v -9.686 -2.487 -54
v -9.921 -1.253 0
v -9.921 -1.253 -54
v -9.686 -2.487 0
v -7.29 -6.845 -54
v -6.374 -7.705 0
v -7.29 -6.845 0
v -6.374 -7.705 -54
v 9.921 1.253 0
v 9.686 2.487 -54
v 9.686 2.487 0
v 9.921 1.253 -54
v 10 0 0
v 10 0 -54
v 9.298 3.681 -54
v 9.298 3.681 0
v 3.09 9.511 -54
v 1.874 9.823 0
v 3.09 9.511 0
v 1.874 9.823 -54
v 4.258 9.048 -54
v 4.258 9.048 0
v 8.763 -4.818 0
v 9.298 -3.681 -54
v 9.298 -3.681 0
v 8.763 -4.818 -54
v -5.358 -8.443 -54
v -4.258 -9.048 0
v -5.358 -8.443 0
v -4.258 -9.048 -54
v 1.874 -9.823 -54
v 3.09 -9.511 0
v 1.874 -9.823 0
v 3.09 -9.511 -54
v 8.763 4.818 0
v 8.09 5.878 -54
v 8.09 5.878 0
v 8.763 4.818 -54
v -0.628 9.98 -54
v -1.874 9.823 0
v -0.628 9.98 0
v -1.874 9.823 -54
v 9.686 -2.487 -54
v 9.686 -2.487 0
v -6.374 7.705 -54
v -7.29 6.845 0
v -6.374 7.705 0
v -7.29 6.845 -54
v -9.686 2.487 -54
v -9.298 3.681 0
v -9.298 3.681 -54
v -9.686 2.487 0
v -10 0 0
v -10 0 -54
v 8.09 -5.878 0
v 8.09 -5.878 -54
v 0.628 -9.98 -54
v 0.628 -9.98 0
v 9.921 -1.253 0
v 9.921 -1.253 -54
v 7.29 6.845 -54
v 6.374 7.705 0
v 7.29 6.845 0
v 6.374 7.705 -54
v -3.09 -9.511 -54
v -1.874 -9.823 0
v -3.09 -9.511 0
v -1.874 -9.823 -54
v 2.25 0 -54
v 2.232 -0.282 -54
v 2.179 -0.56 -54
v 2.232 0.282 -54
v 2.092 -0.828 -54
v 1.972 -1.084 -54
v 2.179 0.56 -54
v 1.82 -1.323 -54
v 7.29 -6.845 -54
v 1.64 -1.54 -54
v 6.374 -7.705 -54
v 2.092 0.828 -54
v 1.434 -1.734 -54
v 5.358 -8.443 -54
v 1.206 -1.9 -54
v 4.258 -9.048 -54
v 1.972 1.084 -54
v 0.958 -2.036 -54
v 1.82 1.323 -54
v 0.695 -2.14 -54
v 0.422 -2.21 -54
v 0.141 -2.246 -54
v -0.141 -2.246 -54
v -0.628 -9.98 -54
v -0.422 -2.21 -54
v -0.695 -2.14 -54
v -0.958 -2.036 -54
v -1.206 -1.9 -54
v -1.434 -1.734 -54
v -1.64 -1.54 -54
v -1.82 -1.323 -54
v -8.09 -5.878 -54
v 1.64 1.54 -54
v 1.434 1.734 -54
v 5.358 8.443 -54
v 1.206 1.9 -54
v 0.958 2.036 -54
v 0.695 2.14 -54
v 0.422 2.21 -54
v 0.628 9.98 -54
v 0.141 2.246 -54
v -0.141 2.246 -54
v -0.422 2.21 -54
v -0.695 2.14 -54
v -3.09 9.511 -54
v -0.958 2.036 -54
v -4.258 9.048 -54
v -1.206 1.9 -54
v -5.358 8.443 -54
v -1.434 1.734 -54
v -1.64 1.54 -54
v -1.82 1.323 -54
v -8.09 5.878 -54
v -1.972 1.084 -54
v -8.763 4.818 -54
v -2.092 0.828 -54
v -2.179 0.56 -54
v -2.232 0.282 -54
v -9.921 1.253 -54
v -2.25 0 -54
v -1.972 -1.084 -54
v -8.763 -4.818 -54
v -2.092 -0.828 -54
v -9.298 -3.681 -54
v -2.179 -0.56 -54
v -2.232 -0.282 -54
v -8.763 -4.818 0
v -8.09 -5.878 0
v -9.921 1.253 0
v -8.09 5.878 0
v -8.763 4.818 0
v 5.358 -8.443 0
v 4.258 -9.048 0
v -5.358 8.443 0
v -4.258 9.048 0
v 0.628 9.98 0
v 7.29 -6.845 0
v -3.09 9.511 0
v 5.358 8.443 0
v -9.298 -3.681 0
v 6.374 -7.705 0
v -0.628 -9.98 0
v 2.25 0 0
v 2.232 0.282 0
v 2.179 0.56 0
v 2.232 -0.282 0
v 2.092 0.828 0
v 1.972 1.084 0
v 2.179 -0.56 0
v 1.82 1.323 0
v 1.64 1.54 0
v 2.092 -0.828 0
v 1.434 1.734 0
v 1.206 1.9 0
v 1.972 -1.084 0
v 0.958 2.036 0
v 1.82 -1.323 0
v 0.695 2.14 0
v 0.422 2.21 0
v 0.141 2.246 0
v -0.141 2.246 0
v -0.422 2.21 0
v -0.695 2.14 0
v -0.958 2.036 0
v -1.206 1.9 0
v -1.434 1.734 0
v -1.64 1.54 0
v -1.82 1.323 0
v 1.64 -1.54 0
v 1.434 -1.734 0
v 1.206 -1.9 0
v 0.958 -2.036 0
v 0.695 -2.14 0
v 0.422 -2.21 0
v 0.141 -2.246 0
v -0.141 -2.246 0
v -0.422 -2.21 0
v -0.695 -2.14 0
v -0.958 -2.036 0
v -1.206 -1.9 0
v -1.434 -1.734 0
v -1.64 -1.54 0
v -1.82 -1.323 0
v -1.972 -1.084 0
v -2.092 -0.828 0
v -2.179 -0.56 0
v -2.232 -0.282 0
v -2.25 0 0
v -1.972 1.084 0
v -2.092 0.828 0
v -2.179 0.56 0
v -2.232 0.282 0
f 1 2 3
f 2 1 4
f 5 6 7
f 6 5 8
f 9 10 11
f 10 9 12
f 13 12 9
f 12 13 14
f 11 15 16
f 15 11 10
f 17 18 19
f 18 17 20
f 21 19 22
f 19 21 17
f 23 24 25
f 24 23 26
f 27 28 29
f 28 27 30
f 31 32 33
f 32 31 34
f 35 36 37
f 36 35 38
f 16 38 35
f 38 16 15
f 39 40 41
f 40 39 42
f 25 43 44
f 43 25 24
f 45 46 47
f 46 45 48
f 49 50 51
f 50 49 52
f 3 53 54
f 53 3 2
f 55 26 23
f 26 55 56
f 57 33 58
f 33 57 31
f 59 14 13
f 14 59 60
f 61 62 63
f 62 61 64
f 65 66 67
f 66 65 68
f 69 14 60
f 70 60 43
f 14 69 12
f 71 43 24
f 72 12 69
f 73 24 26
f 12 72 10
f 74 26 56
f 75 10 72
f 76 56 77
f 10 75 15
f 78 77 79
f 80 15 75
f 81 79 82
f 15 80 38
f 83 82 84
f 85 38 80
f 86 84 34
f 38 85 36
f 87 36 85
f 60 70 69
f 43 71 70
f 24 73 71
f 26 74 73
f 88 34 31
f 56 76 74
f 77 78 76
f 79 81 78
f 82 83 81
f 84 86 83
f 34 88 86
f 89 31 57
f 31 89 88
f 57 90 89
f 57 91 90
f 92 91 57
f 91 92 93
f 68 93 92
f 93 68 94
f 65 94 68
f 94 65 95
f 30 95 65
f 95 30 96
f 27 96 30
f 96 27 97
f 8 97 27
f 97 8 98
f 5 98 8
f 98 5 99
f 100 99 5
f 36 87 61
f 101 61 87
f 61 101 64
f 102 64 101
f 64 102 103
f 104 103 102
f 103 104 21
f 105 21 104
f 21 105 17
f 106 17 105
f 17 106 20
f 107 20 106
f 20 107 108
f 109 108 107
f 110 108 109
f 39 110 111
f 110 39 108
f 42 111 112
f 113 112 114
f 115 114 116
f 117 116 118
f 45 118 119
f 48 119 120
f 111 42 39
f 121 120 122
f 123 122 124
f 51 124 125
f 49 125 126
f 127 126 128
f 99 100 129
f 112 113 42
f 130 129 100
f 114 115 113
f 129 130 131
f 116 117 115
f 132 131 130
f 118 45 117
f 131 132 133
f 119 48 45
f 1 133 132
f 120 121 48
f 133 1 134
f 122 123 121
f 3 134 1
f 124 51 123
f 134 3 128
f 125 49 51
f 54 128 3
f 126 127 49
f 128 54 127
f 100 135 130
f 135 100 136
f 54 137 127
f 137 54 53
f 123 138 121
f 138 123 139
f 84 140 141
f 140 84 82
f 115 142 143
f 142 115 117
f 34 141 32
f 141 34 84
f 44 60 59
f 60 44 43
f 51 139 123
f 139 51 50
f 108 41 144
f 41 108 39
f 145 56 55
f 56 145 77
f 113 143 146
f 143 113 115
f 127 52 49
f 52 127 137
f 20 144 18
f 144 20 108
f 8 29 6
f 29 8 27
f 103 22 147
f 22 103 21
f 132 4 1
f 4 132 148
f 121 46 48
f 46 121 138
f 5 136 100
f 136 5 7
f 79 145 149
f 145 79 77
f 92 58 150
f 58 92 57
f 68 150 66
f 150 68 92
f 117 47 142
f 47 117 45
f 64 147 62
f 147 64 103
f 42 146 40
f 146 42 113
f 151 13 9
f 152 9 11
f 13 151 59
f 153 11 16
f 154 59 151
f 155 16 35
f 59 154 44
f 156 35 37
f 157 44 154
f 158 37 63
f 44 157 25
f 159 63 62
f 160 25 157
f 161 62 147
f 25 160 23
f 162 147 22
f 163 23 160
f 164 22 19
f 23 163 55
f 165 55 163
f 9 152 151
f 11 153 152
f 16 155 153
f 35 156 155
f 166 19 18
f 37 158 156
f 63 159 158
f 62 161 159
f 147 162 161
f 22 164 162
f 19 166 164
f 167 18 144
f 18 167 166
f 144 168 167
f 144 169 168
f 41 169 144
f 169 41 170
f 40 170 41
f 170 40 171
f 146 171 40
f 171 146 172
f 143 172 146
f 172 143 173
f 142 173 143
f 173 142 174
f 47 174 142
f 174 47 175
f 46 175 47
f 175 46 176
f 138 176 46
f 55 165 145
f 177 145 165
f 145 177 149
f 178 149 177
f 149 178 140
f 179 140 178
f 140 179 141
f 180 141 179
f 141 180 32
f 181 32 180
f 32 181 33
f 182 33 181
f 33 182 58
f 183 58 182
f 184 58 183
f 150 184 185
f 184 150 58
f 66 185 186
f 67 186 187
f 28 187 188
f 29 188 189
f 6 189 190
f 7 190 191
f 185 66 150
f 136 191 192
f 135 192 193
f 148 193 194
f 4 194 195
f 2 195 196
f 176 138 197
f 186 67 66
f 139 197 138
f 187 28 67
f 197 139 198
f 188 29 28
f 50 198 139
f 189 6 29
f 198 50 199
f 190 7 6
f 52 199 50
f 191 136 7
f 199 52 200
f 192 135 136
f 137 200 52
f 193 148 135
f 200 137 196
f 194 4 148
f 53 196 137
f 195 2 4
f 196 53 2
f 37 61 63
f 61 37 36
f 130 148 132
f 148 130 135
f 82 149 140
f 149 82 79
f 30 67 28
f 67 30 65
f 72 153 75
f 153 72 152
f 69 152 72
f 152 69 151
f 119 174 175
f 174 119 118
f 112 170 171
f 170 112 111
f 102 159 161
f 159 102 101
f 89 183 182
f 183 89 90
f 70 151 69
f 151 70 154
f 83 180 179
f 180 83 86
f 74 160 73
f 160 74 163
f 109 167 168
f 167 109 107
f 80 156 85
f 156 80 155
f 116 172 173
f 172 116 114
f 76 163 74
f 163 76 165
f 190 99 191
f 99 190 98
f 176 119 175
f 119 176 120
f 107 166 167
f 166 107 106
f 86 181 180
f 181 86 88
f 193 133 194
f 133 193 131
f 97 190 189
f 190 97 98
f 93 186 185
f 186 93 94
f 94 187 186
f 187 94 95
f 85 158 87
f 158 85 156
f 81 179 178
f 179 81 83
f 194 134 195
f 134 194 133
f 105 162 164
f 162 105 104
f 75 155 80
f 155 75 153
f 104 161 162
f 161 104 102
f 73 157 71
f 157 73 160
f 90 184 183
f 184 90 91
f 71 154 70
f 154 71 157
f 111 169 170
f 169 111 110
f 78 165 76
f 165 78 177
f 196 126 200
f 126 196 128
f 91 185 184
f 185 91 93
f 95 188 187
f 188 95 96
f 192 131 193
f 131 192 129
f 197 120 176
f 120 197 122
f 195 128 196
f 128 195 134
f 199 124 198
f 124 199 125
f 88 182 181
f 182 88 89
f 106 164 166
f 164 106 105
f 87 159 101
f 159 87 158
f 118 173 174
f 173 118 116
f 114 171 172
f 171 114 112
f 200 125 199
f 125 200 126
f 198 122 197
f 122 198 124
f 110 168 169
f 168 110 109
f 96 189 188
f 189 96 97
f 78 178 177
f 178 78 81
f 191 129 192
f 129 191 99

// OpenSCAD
$fn = 50;


difference() {
	union() {
		translate(v = [0, 0, -54.0000000000]) {
			cylinder(h = 54, r = 10.0000000000);
		}
		cylinder(h = 0, r = 20.0000000000);
	}
	union() {
		#translate(v = [0, 0, -54]) {
			cylinder(h = 54, r = 2.2500000000);
		}
	}
}
